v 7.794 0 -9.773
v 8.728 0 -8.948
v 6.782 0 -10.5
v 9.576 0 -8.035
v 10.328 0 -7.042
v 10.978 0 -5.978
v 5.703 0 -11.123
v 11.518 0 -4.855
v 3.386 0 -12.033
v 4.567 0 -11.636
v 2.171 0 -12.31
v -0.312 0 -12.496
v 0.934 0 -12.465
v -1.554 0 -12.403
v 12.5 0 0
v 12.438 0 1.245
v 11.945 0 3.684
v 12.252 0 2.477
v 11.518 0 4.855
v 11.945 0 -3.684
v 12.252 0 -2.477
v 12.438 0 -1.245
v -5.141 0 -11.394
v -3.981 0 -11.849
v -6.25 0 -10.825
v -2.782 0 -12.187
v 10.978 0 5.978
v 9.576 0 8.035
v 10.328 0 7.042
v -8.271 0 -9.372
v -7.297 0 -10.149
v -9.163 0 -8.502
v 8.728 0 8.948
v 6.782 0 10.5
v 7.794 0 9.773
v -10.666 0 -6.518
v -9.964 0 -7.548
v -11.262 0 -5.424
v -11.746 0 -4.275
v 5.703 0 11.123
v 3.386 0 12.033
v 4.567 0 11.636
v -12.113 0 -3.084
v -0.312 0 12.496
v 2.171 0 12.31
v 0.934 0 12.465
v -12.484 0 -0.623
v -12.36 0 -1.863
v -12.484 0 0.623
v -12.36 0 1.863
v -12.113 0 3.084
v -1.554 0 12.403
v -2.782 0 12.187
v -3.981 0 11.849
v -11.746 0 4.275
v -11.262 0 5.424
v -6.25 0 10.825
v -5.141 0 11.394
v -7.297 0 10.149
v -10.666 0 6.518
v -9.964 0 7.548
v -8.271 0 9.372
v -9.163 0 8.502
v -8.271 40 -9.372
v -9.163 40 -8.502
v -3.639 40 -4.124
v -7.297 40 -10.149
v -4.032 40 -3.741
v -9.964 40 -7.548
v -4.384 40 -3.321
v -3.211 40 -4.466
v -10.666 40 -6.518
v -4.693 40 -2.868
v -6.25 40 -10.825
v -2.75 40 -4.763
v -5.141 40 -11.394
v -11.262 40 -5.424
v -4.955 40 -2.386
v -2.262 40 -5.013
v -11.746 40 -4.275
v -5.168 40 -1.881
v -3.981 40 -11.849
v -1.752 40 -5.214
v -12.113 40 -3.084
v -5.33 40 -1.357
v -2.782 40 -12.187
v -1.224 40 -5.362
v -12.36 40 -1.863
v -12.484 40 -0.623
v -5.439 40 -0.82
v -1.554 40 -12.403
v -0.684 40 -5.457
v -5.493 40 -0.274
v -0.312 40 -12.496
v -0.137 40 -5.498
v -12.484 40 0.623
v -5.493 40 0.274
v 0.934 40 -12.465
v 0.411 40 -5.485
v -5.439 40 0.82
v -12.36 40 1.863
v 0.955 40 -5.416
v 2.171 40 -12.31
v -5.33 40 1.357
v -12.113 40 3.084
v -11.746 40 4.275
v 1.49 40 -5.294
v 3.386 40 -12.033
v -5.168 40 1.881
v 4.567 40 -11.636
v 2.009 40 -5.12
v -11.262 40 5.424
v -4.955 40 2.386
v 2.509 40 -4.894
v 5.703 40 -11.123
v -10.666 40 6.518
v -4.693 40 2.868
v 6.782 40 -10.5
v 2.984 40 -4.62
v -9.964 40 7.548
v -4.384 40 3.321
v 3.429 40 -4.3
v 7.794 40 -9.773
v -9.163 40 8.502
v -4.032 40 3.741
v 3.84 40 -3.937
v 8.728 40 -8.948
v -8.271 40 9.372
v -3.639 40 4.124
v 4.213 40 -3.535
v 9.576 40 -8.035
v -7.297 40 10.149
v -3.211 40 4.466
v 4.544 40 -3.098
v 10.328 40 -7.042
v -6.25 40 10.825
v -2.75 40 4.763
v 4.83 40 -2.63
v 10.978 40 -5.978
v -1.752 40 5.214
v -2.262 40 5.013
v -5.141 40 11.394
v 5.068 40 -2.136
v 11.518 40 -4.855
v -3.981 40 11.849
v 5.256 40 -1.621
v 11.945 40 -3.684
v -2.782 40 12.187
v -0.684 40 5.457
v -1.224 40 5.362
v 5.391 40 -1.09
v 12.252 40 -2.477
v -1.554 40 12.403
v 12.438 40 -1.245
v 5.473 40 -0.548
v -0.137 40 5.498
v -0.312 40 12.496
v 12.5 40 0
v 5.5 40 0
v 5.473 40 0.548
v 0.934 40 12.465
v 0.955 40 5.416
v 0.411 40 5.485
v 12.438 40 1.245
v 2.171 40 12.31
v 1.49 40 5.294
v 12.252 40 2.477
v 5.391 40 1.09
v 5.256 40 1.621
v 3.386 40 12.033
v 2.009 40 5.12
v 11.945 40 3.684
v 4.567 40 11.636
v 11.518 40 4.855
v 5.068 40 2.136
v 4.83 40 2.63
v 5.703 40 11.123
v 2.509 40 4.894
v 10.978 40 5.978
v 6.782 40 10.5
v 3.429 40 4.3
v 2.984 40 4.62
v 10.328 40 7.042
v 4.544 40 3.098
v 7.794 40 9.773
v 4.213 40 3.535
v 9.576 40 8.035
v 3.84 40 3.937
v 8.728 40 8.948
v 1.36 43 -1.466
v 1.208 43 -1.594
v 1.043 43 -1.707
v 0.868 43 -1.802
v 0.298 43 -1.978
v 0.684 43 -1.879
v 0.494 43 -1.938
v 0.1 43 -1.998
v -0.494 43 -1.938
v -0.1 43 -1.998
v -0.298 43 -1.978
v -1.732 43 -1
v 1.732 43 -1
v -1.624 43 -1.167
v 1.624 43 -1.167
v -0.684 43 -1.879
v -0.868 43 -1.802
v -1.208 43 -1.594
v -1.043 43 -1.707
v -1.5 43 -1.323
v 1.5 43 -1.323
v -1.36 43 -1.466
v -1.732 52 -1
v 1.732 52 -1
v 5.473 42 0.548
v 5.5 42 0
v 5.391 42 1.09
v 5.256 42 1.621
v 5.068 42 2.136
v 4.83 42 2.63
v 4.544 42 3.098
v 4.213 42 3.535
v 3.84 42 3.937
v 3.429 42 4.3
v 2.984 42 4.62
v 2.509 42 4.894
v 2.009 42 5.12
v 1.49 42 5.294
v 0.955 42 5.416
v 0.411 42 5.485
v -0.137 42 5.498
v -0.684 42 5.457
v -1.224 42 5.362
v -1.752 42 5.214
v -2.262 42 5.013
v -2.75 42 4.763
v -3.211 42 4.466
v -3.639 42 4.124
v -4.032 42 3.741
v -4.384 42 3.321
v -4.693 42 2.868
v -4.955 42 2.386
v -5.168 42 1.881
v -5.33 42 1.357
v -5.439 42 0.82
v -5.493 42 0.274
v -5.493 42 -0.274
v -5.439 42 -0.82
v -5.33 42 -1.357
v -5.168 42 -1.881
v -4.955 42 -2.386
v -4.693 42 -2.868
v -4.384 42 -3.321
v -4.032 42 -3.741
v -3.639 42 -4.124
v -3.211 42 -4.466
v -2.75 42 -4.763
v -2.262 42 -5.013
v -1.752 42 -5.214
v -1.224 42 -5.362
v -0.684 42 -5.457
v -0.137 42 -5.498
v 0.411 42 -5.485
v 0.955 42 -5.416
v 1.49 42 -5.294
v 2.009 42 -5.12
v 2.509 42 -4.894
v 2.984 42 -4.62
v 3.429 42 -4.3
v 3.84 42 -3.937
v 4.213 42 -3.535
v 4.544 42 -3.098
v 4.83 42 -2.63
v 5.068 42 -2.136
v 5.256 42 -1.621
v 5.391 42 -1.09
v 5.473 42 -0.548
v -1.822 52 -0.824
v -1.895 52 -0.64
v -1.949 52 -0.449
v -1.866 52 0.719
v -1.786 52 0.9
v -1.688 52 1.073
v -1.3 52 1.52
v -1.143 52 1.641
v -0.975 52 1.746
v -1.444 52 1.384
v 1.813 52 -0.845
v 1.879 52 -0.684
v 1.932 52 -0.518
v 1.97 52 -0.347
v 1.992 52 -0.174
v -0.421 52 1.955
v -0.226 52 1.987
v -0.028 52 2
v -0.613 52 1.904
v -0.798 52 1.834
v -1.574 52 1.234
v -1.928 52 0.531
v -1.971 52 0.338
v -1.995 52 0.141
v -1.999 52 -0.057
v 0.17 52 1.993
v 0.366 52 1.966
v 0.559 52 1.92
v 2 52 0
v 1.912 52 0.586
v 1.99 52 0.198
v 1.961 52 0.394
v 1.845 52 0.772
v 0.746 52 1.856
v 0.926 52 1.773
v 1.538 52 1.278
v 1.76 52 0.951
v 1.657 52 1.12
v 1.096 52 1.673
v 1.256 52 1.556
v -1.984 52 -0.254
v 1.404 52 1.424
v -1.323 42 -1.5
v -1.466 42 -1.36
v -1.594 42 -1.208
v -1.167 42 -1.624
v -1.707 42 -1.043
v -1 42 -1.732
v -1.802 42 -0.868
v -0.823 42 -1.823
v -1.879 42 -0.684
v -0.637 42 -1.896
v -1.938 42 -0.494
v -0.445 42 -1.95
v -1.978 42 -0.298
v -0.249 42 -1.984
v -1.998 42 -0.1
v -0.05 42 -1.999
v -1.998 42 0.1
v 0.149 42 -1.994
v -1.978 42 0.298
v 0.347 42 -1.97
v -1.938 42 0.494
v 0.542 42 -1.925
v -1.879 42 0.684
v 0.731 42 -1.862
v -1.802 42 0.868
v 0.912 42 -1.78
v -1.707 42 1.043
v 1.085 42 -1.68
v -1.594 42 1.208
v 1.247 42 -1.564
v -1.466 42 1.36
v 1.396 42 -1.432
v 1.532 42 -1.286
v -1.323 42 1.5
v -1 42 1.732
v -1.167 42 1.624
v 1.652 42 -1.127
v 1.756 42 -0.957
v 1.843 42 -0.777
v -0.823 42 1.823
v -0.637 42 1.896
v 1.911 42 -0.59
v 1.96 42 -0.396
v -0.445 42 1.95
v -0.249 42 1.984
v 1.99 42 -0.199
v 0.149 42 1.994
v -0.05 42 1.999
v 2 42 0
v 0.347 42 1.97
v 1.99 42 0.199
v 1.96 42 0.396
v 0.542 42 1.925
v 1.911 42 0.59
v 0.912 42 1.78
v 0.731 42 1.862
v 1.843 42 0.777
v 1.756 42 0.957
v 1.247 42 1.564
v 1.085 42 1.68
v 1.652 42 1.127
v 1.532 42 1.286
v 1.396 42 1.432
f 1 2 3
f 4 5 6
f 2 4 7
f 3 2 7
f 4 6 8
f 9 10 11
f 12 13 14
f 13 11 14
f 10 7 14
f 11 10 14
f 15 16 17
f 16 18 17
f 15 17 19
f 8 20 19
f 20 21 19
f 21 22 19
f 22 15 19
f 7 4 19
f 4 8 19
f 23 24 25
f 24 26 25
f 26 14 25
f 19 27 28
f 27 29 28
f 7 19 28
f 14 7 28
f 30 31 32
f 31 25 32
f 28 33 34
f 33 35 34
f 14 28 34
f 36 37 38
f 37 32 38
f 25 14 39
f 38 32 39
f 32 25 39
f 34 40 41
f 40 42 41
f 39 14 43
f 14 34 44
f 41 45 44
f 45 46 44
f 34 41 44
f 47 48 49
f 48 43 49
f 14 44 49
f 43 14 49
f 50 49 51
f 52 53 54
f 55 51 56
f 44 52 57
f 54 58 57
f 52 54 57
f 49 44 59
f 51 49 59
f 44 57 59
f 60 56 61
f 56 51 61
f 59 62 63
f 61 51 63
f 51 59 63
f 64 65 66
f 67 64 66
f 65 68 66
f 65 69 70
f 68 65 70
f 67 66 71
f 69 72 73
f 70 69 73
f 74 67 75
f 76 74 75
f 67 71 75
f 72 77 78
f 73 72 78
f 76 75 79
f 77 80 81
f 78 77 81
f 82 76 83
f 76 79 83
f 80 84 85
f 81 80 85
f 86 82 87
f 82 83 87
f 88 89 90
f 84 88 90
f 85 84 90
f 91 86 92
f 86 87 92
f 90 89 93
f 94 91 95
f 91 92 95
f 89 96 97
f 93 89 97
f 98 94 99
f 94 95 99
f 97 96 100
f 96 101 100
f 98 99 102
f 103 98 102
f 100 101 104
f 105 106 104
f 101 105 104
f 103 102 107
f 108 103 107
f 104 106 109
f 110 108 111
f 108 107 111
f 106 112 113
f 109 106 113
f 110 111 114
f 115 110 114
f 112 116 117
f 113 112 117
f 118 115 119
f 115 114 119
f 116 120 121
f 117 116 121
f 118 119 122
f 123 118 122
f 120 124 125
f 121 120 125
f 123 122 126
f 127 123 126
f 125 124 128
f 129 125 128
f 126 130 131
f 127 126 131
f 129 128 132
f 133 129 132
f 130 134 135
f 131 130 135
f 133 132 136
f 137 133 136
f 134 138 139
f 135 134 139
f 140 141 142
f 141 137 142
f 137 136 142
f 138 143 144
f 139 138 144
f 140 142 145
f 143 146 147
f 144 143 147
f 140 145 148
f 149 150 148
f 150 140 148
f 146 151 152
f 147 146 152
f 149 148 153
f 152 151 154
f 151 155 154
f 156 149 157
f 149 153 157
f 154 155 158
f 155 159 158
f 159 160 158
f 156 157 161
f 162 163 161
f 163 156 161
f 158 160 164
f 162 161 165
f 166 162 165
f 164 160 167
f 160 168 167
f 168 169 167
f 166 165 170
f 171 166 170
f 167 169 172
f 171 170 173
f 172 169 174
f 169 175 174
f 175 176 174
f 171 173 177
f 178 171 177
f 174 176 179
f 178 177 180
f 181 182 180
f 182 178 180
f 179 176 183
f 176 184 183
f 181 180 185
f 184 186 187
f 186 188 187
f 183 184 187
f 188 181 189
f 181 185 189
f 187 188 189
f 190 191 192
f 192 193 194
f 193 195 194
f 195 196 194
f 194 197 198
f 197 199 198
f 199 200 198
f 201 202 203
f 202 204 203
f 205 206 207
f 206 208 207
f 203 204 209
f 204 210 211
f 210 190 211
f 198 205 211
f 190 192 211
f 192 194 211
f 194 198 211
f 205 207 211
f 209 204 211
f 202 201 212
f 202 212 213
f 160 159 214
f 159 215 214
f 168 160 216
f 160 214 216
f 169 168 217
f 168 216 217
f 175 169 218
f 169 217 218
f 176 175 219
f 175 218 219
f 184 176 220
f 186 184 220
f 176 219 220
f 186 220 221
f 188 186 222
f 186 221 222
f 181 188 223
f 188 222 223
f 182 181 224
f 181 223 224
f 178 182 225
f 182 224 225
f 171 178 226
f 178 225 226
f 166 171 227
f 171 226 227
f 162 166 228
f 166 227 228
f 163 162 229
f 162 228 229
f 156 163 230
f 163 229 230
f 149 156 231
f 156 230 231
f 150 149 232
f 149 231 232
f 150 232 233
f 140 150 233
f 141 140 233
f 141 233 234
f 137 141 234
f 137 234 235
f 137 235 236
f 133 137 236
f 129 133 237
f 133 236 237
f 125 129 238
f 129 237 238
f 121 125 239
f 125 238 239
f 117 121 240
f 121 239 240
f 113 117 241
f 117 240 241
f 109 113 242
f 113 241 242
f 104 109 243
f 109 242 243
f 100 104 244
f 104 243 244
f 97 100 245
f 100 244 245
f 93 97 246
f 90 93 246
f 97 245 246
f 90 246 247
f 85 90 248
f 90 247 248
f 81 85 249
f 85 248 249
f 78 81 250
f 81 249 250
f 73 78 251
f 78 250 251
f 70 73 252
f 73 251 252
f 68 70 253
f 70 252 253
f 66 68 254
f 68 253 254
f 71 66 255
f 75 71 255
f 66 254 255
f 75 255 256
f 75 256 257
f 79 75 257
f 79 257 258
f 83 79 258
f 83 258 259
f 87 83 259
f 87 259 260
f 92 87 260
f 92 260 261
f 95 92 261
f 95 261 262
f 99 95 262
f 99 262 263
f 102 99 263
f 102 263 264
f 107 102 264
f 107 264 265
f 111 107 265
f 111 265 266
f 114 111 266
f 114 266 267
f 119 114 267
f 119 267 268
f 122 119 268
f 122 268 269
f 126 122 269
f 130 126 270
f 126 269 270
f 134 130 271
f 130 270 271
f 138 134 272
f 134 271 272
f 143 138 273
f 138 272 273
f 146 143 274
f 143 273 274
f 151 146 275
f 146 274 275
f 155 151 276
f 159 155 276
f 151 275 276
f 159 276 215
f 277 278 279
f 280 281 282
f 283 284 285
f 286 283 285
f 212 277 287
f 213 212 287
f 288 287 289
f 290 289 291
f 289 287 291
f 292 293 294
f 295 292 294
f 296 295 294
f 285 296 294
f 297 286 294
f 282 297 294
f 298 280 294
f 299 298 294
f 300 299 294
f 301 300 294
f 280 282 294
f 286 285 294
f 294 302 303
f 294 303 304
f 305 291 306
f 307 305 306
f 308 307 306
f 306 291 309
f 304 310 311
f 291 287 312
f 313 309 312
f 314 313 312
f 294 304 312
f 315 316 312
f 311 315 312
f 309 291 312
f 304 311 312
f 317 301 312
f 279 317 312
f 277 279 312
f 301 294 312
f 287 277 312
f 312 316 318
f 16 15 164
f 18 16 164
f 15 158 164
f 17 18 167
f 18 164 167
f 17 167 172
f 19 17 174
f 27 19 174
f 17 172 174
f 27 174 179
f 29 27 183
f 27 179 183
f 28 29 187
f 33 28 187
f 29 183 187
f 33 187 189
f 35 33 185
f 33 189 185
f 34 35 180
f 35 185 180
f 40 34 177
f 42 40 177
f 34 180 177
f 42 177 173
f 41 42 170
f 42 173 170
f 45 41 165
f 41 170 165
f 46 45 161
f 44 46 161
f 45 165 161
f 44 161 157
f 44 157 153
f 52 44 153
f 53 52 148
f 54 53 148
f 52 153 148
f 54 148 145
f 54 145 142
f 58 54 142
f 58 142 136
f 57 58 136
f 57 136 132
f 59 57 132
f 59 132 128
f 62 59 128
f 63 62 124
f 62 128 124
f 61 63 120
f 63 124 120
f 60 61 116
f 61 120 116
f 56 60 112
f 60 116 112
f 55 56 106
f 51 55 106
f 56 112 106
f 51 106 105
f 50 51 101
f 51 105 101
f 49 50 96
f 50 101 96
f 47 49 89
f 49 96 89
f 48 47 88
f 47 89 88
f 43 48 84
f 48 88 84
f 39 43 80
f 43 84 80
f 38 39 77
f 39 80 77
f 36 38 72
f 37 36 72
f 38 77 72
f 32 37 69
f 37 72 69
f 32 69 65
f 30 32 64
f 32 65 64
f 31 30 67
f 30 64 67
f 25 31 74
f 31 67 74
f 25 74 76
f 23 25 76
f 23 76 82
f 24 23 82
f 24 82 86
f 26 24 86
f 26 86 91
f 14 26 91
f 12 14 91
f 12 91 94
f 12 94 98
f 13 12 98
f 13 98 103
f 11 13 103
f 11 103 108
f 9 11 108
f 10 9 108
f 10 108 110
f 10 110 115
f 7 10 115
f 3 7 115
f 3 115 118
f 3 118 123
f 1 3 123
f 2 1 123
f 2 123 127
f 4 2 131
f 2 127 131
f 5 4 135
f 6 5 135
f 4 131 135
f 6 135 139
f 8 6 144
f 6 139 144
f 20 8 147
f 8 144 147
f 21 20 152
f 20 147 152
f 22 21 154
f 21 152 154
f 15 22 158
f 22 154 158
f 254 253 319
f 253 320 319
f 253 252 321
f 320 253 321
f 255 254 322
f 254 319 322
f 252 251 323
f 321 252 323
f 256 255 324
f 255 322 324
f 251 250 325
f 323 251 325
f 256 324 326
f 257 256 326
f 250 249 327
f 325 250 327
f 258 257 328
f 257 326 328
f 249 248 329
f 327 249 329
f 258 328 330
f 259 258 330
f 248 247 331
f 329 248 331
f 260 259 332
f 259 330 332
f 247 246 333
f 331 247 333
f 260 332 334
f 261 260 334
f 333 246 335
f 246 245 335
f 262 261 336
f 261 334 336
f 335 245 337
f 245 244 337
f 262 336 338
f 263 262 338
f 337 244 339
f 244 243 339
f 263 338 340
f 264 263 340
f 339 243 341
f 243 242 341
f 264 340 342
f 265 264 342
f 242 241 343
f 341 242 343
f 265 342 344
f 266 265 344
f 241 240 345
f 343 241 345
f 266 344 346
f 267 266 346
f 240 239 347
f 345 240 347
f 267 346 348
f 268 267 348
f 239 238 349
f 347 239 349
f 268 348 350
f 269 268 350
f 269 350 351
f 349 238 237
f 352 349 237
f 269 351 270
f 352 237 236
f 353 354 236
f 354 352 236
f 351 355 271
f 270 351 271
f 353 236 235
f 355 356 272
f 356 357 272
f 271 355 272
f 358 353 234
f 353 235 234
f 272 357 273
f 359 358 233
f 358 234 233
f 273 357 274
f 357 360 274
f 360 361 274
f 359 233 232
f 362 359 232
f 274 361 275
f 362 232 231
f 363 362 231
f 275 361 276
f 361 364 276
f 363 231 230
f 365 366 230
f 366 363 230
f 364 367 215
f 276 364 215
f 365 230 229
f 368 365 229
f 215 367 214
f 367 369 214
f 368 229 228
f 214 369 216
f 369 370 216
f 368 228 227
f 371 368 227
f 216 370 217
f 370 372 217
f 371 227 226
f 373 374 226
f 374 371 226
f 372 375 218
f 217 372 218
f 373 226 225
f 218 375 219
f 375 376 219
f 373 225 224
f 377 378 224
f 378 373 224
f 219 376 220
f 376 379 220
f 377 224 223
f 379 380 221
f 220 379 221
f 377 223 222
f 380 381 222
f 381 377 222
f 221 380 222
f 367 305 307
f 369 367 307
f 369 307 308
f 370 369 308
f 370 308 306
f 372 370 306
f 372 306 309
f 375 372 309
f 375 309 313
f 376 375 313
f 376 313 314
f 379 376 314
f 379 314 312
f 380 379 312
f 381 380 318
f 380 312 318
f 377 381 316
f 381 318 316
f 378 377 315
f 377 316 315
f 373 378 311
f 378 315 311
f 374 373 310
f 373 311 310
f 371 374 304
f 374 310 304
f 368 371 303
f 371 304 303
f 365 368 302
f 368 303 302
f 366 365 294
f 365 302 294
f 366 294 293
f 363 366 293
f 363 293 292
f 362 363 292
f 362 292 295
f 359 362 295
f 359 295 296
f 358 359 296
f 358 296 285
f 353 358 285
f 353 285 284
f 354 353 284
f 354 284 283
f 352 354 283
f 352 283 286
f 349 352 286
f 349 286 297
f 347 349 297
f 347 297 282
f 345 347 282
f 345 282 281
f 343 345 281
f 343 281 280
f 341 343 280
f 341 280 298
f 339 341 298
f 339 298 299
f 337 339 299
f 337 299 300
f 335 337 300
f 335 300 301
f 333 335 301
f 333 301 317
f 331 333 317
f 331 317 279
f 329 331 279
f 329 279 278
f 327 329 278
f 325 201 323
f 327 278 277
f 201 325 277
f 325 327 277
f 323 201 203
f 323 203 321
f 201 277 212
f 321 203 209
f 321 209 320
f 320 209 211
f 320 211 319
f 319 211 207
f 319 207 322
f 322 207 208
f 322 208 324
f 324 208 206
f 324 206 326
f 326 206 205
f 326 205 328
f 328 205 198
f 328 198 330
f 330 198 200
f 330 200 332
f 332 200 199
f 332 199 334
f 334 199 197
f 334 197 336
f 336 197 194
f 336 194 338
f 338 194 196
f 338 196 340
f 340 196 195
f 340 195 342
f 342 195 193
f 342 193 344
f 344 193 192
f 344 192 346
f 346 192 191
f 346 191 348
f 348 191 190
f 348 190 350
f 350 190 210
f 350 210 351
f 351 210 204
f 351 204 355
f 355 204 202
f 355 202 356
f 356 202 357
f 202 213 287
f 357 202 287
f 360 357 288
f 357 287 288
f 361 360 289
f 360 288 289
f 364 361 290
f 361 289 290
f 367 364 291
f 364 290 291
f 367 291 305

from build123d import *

# Parameters (mm, degrees)
CORTE_EXTRUS_O_FINA1_DEPTH = 9


with BuildPart() as part:
    # Esboço1 → Revolução1 (revolve)
    with BuildSketch(Plane.XY):
        Polygon((0, 0), (12.5, 0), (12.5, 40), (5.5, 40), (5.5, 42), (2, 42), (2, 52), (0, 52), align=None)
    revolve(axis=Axis((0, 52, 0), (0, -1, 0)))

    # Esboço2 → Corte-Extrusão-Fina1 (cut)
    with BuildSketch(Plane(origin=(0, 52, 0), x_dir=(1, 0, 0), z_dir=(0, 1, 0))):
        with BuildLine():
            Line((-4.795831523, 11), (4.795831523, 11))
            ThreePointArc((4.795831523, 11), (0, -12), (-4.795831523, 11))
        make_face()
        with BuildLine():
            Line((-1.732050808, 1), (1.732050808, 1))
            ThreePointArc((1.732050808, 1), (0, -2), (-1.732050808, 1))
        make_face(mode=Mode.SUBTRACT)
    extrude(amount=-CORTE_EXTRUS_O_FINA1_DEPTH, mode=Mode.SUBTRACT)


solid = part.part
